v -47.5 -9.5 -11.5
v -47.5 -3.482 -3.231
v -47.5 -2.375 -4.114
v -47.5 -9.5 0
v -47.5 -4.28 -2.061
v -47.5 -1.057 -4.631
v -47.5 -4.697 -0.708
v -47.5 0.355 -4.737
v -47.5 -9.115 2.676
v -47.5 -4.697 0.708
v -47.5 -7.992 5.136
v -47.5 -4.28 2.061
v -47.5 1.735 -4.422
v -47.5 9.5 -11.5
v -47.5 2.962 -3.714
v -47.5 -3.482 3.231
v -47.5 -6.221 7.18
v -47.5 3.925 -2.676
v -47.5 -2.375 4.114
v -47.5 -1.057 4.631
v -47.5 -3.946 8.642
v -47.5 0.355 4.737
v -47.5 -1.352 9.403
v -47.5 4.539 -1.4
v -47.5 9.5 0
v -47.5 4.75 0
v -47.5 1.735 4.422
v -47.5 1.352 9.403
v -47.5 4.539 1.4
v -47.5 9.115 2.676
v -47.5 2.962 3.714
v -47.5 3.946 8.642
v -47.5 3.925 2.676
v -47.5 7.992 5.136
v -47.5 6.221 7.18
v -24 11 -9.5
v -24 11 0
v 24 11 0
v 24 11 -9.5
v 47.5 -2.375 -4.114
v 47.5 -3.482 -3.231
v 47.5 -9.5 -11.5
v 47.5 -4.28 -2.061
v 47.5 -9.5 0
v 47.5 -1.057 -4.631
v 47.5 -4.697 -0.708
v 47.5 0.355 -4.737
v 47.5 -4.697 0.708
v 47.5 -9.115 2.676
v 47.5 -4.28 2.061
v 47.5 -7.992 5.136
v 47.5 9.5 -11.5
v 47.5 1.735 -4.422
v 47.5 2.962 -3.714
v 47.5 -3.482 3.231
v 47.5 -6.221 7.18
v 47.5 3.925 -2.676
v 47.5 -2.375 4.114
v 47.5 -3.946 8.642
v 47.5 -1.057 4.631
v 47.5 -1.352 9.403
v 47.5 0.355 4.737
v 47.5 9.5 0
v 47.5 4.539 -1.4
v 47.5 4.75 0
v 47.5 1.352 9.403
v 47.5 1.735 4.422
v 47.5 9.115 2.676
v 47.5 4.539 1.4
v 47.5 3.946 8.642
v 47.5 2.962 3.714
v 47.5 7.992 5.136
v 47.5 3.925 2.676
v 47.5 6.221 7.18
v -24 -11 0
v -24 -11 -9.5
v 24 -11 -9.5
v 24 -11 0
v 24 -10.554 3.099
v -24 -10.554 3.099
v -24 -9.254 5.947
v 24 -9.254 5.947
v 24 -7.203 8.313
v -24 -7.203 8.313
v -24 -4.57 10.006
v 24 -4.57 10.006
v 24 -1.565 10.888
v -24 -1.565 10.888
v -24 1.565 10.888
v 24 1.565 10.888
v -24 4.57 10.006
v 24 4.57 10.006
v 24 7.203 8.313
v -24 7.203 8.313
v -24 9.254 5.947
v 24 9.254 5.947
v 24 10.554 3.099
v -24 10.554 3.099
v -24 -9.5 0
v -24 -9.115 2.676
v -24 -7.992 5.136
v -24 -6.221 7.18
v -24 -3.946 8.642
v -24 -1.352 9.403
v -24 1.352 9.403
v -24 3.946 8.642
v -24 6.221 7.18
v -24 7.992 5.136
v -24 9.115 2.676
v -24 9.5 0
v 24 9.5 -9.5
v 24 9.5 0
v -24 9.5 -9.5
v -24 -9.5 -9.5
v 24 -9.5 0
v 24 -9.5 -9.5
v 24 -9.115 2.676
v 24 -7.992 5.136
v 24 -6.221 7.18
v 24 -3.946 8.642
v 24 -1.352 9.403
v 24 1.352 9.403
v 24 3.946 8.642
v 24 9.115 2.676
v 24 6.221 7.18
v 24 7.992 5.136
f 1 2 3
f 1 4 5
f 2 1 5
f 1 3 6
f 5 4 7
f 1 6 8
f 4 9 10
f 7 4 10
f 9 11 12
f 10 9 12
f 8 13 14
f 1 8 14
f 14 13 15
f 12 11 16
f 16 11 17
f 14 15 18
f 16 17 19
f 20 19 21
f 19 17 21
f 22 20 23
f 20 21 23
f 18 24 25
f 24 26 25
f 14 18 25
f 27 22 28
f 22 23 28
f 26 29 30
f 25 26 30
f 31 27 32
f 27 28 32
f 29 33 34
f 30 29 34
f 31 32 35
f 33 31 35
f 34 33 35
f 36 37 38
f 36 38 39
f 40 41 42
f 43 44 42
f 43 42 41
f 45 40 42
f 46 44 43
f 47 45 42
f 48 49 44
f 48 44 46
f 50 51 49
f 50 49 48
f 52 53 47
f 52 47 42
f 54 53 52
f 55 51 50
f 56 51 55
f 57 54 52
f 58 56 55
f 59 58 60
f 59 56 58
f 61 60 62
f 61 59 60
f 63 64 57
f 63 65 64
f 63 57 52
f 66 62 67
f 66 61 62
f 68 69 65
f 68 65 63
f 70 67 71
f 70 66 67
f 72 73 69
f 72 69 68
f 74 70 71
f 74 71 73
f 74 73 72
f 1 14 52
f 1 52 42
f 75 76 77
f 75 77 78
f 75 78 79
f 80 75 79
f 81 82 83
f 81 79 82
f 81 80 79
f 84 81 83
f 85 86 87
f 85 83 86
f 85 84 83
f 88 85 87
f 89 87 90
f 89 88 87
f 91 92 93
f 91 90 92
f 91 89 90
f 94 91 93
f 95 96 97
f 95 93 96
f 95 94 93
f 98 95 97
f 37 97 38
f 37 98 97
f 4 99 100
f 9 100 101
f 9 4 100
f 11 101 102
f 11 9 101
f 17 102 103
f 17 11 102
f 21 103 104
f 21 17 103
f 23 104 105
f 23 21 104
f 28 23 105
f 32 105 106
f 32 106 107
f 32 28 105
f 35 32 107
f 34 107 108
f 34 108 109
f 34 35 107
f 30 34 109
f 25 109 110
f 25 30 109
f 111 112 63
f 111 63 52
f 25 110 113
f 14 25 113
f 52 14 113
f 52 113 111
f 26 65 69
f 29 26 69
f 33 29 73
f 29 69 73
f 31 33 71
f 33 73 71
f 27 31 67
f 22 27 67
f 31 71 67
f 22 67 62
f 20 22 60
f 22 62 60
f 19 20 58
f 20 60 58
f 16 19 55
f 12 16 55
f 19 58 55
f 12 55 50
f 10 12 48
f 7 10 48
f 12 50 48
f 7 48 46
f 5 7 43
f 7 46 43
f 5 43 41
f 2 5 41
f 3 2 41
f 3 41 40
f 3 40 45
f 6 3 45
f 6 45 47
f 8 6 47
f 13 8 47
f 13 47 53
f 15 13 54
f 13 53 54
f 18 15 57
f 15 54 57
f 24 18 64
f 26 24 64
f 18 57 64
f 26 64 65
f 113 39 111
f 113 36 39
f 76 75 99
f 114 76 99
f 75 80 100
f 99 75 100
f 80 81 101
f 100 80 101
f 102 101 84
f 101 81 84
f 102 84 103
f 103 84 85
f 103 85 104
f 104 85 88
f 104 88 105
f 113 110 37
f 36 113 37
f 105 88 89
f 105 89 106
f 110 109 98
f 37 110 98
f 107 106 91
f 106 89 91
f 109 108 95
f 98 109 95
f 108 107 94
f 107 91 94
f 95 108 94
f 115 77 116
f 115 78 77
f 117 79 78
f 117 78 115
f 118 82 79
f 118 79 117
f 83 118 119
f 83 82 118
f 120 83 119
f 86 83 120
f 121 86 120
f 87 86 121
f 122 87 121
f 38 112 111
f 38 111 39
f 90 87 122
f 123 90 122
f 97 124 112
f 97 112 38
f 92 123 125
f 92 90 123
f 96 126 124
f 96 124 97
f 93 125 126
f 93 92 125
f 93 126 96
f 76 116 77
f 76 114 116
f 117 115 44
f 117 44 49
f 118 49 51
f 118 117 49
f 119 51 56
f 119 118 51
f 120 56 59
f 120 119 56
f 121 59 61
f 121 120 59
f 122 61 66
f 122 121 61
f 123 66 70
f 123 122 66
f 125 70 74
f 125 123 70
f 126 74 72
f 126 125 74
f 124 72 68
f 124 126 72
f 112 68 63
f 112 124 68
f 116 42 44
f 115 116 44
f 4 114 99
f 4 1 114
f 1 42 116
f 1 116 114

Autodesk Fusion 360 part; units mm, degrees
sketch "スケッチ4" plane through (0, 0, 0) normal (1, 0, 0) x (0, 1, 0)
  arc A0 (9.5, 0) -> (-9.5, 0) centre (0, 0) ccw
  line L0 (9.5, 0) -> (9.5, -11.5)
  line L1 (9.5, -11.5) -> (-9.5, -11.5)
  line L2 (-9.5, -11.5) -> (-9.5, 0)
  dimension "d8" = 9.5
  dimension "d9" = 19
  dimension "d10" = 11.5
extrude "押し出し2" add sketch "スケッチ4" along normal mid plane 95
sketch "スケッチ6" plane through (0, 0, 0) normal (1, 0, 0) x (0, 1, 0)
  arc A0 (11, 0) -> (-11, 0) centre (0, 0) ccw
  line L0 (11, 0) -> (11, -9.5)
  line L1 (11, -9.5) -> (-11, -9.5)
  line L2 (-11, -9.5) -> (-11, 0)
  dimension "d17" = 9.5
  dimension "d18" = 22
extrude "押し出し3" add sketch "スケッチ6" along normal mid plane 48
sketch "スケッチ7" plane through (47.5, 0, 0) normal (1, 0, 0) x (0, 1, 0)
  arc A0 (9.5, 0) -> (-9.5, 0) centre (0, 0) ccw
  line L0 (-9.5, 0) -> (-9.5, -11.5)
  line L1 (-9.5, -11.5) -> (9.5, -11.5)
  line L2 (9.5, -11.5) -> (9.5, 0)
  circle A1 centre (0, 0) radius 4.75
  dimension "d21" = 9.5
extrude "押し出し4" cut sketch "スケッチ7" along normal through all and the other way through all contours A1
